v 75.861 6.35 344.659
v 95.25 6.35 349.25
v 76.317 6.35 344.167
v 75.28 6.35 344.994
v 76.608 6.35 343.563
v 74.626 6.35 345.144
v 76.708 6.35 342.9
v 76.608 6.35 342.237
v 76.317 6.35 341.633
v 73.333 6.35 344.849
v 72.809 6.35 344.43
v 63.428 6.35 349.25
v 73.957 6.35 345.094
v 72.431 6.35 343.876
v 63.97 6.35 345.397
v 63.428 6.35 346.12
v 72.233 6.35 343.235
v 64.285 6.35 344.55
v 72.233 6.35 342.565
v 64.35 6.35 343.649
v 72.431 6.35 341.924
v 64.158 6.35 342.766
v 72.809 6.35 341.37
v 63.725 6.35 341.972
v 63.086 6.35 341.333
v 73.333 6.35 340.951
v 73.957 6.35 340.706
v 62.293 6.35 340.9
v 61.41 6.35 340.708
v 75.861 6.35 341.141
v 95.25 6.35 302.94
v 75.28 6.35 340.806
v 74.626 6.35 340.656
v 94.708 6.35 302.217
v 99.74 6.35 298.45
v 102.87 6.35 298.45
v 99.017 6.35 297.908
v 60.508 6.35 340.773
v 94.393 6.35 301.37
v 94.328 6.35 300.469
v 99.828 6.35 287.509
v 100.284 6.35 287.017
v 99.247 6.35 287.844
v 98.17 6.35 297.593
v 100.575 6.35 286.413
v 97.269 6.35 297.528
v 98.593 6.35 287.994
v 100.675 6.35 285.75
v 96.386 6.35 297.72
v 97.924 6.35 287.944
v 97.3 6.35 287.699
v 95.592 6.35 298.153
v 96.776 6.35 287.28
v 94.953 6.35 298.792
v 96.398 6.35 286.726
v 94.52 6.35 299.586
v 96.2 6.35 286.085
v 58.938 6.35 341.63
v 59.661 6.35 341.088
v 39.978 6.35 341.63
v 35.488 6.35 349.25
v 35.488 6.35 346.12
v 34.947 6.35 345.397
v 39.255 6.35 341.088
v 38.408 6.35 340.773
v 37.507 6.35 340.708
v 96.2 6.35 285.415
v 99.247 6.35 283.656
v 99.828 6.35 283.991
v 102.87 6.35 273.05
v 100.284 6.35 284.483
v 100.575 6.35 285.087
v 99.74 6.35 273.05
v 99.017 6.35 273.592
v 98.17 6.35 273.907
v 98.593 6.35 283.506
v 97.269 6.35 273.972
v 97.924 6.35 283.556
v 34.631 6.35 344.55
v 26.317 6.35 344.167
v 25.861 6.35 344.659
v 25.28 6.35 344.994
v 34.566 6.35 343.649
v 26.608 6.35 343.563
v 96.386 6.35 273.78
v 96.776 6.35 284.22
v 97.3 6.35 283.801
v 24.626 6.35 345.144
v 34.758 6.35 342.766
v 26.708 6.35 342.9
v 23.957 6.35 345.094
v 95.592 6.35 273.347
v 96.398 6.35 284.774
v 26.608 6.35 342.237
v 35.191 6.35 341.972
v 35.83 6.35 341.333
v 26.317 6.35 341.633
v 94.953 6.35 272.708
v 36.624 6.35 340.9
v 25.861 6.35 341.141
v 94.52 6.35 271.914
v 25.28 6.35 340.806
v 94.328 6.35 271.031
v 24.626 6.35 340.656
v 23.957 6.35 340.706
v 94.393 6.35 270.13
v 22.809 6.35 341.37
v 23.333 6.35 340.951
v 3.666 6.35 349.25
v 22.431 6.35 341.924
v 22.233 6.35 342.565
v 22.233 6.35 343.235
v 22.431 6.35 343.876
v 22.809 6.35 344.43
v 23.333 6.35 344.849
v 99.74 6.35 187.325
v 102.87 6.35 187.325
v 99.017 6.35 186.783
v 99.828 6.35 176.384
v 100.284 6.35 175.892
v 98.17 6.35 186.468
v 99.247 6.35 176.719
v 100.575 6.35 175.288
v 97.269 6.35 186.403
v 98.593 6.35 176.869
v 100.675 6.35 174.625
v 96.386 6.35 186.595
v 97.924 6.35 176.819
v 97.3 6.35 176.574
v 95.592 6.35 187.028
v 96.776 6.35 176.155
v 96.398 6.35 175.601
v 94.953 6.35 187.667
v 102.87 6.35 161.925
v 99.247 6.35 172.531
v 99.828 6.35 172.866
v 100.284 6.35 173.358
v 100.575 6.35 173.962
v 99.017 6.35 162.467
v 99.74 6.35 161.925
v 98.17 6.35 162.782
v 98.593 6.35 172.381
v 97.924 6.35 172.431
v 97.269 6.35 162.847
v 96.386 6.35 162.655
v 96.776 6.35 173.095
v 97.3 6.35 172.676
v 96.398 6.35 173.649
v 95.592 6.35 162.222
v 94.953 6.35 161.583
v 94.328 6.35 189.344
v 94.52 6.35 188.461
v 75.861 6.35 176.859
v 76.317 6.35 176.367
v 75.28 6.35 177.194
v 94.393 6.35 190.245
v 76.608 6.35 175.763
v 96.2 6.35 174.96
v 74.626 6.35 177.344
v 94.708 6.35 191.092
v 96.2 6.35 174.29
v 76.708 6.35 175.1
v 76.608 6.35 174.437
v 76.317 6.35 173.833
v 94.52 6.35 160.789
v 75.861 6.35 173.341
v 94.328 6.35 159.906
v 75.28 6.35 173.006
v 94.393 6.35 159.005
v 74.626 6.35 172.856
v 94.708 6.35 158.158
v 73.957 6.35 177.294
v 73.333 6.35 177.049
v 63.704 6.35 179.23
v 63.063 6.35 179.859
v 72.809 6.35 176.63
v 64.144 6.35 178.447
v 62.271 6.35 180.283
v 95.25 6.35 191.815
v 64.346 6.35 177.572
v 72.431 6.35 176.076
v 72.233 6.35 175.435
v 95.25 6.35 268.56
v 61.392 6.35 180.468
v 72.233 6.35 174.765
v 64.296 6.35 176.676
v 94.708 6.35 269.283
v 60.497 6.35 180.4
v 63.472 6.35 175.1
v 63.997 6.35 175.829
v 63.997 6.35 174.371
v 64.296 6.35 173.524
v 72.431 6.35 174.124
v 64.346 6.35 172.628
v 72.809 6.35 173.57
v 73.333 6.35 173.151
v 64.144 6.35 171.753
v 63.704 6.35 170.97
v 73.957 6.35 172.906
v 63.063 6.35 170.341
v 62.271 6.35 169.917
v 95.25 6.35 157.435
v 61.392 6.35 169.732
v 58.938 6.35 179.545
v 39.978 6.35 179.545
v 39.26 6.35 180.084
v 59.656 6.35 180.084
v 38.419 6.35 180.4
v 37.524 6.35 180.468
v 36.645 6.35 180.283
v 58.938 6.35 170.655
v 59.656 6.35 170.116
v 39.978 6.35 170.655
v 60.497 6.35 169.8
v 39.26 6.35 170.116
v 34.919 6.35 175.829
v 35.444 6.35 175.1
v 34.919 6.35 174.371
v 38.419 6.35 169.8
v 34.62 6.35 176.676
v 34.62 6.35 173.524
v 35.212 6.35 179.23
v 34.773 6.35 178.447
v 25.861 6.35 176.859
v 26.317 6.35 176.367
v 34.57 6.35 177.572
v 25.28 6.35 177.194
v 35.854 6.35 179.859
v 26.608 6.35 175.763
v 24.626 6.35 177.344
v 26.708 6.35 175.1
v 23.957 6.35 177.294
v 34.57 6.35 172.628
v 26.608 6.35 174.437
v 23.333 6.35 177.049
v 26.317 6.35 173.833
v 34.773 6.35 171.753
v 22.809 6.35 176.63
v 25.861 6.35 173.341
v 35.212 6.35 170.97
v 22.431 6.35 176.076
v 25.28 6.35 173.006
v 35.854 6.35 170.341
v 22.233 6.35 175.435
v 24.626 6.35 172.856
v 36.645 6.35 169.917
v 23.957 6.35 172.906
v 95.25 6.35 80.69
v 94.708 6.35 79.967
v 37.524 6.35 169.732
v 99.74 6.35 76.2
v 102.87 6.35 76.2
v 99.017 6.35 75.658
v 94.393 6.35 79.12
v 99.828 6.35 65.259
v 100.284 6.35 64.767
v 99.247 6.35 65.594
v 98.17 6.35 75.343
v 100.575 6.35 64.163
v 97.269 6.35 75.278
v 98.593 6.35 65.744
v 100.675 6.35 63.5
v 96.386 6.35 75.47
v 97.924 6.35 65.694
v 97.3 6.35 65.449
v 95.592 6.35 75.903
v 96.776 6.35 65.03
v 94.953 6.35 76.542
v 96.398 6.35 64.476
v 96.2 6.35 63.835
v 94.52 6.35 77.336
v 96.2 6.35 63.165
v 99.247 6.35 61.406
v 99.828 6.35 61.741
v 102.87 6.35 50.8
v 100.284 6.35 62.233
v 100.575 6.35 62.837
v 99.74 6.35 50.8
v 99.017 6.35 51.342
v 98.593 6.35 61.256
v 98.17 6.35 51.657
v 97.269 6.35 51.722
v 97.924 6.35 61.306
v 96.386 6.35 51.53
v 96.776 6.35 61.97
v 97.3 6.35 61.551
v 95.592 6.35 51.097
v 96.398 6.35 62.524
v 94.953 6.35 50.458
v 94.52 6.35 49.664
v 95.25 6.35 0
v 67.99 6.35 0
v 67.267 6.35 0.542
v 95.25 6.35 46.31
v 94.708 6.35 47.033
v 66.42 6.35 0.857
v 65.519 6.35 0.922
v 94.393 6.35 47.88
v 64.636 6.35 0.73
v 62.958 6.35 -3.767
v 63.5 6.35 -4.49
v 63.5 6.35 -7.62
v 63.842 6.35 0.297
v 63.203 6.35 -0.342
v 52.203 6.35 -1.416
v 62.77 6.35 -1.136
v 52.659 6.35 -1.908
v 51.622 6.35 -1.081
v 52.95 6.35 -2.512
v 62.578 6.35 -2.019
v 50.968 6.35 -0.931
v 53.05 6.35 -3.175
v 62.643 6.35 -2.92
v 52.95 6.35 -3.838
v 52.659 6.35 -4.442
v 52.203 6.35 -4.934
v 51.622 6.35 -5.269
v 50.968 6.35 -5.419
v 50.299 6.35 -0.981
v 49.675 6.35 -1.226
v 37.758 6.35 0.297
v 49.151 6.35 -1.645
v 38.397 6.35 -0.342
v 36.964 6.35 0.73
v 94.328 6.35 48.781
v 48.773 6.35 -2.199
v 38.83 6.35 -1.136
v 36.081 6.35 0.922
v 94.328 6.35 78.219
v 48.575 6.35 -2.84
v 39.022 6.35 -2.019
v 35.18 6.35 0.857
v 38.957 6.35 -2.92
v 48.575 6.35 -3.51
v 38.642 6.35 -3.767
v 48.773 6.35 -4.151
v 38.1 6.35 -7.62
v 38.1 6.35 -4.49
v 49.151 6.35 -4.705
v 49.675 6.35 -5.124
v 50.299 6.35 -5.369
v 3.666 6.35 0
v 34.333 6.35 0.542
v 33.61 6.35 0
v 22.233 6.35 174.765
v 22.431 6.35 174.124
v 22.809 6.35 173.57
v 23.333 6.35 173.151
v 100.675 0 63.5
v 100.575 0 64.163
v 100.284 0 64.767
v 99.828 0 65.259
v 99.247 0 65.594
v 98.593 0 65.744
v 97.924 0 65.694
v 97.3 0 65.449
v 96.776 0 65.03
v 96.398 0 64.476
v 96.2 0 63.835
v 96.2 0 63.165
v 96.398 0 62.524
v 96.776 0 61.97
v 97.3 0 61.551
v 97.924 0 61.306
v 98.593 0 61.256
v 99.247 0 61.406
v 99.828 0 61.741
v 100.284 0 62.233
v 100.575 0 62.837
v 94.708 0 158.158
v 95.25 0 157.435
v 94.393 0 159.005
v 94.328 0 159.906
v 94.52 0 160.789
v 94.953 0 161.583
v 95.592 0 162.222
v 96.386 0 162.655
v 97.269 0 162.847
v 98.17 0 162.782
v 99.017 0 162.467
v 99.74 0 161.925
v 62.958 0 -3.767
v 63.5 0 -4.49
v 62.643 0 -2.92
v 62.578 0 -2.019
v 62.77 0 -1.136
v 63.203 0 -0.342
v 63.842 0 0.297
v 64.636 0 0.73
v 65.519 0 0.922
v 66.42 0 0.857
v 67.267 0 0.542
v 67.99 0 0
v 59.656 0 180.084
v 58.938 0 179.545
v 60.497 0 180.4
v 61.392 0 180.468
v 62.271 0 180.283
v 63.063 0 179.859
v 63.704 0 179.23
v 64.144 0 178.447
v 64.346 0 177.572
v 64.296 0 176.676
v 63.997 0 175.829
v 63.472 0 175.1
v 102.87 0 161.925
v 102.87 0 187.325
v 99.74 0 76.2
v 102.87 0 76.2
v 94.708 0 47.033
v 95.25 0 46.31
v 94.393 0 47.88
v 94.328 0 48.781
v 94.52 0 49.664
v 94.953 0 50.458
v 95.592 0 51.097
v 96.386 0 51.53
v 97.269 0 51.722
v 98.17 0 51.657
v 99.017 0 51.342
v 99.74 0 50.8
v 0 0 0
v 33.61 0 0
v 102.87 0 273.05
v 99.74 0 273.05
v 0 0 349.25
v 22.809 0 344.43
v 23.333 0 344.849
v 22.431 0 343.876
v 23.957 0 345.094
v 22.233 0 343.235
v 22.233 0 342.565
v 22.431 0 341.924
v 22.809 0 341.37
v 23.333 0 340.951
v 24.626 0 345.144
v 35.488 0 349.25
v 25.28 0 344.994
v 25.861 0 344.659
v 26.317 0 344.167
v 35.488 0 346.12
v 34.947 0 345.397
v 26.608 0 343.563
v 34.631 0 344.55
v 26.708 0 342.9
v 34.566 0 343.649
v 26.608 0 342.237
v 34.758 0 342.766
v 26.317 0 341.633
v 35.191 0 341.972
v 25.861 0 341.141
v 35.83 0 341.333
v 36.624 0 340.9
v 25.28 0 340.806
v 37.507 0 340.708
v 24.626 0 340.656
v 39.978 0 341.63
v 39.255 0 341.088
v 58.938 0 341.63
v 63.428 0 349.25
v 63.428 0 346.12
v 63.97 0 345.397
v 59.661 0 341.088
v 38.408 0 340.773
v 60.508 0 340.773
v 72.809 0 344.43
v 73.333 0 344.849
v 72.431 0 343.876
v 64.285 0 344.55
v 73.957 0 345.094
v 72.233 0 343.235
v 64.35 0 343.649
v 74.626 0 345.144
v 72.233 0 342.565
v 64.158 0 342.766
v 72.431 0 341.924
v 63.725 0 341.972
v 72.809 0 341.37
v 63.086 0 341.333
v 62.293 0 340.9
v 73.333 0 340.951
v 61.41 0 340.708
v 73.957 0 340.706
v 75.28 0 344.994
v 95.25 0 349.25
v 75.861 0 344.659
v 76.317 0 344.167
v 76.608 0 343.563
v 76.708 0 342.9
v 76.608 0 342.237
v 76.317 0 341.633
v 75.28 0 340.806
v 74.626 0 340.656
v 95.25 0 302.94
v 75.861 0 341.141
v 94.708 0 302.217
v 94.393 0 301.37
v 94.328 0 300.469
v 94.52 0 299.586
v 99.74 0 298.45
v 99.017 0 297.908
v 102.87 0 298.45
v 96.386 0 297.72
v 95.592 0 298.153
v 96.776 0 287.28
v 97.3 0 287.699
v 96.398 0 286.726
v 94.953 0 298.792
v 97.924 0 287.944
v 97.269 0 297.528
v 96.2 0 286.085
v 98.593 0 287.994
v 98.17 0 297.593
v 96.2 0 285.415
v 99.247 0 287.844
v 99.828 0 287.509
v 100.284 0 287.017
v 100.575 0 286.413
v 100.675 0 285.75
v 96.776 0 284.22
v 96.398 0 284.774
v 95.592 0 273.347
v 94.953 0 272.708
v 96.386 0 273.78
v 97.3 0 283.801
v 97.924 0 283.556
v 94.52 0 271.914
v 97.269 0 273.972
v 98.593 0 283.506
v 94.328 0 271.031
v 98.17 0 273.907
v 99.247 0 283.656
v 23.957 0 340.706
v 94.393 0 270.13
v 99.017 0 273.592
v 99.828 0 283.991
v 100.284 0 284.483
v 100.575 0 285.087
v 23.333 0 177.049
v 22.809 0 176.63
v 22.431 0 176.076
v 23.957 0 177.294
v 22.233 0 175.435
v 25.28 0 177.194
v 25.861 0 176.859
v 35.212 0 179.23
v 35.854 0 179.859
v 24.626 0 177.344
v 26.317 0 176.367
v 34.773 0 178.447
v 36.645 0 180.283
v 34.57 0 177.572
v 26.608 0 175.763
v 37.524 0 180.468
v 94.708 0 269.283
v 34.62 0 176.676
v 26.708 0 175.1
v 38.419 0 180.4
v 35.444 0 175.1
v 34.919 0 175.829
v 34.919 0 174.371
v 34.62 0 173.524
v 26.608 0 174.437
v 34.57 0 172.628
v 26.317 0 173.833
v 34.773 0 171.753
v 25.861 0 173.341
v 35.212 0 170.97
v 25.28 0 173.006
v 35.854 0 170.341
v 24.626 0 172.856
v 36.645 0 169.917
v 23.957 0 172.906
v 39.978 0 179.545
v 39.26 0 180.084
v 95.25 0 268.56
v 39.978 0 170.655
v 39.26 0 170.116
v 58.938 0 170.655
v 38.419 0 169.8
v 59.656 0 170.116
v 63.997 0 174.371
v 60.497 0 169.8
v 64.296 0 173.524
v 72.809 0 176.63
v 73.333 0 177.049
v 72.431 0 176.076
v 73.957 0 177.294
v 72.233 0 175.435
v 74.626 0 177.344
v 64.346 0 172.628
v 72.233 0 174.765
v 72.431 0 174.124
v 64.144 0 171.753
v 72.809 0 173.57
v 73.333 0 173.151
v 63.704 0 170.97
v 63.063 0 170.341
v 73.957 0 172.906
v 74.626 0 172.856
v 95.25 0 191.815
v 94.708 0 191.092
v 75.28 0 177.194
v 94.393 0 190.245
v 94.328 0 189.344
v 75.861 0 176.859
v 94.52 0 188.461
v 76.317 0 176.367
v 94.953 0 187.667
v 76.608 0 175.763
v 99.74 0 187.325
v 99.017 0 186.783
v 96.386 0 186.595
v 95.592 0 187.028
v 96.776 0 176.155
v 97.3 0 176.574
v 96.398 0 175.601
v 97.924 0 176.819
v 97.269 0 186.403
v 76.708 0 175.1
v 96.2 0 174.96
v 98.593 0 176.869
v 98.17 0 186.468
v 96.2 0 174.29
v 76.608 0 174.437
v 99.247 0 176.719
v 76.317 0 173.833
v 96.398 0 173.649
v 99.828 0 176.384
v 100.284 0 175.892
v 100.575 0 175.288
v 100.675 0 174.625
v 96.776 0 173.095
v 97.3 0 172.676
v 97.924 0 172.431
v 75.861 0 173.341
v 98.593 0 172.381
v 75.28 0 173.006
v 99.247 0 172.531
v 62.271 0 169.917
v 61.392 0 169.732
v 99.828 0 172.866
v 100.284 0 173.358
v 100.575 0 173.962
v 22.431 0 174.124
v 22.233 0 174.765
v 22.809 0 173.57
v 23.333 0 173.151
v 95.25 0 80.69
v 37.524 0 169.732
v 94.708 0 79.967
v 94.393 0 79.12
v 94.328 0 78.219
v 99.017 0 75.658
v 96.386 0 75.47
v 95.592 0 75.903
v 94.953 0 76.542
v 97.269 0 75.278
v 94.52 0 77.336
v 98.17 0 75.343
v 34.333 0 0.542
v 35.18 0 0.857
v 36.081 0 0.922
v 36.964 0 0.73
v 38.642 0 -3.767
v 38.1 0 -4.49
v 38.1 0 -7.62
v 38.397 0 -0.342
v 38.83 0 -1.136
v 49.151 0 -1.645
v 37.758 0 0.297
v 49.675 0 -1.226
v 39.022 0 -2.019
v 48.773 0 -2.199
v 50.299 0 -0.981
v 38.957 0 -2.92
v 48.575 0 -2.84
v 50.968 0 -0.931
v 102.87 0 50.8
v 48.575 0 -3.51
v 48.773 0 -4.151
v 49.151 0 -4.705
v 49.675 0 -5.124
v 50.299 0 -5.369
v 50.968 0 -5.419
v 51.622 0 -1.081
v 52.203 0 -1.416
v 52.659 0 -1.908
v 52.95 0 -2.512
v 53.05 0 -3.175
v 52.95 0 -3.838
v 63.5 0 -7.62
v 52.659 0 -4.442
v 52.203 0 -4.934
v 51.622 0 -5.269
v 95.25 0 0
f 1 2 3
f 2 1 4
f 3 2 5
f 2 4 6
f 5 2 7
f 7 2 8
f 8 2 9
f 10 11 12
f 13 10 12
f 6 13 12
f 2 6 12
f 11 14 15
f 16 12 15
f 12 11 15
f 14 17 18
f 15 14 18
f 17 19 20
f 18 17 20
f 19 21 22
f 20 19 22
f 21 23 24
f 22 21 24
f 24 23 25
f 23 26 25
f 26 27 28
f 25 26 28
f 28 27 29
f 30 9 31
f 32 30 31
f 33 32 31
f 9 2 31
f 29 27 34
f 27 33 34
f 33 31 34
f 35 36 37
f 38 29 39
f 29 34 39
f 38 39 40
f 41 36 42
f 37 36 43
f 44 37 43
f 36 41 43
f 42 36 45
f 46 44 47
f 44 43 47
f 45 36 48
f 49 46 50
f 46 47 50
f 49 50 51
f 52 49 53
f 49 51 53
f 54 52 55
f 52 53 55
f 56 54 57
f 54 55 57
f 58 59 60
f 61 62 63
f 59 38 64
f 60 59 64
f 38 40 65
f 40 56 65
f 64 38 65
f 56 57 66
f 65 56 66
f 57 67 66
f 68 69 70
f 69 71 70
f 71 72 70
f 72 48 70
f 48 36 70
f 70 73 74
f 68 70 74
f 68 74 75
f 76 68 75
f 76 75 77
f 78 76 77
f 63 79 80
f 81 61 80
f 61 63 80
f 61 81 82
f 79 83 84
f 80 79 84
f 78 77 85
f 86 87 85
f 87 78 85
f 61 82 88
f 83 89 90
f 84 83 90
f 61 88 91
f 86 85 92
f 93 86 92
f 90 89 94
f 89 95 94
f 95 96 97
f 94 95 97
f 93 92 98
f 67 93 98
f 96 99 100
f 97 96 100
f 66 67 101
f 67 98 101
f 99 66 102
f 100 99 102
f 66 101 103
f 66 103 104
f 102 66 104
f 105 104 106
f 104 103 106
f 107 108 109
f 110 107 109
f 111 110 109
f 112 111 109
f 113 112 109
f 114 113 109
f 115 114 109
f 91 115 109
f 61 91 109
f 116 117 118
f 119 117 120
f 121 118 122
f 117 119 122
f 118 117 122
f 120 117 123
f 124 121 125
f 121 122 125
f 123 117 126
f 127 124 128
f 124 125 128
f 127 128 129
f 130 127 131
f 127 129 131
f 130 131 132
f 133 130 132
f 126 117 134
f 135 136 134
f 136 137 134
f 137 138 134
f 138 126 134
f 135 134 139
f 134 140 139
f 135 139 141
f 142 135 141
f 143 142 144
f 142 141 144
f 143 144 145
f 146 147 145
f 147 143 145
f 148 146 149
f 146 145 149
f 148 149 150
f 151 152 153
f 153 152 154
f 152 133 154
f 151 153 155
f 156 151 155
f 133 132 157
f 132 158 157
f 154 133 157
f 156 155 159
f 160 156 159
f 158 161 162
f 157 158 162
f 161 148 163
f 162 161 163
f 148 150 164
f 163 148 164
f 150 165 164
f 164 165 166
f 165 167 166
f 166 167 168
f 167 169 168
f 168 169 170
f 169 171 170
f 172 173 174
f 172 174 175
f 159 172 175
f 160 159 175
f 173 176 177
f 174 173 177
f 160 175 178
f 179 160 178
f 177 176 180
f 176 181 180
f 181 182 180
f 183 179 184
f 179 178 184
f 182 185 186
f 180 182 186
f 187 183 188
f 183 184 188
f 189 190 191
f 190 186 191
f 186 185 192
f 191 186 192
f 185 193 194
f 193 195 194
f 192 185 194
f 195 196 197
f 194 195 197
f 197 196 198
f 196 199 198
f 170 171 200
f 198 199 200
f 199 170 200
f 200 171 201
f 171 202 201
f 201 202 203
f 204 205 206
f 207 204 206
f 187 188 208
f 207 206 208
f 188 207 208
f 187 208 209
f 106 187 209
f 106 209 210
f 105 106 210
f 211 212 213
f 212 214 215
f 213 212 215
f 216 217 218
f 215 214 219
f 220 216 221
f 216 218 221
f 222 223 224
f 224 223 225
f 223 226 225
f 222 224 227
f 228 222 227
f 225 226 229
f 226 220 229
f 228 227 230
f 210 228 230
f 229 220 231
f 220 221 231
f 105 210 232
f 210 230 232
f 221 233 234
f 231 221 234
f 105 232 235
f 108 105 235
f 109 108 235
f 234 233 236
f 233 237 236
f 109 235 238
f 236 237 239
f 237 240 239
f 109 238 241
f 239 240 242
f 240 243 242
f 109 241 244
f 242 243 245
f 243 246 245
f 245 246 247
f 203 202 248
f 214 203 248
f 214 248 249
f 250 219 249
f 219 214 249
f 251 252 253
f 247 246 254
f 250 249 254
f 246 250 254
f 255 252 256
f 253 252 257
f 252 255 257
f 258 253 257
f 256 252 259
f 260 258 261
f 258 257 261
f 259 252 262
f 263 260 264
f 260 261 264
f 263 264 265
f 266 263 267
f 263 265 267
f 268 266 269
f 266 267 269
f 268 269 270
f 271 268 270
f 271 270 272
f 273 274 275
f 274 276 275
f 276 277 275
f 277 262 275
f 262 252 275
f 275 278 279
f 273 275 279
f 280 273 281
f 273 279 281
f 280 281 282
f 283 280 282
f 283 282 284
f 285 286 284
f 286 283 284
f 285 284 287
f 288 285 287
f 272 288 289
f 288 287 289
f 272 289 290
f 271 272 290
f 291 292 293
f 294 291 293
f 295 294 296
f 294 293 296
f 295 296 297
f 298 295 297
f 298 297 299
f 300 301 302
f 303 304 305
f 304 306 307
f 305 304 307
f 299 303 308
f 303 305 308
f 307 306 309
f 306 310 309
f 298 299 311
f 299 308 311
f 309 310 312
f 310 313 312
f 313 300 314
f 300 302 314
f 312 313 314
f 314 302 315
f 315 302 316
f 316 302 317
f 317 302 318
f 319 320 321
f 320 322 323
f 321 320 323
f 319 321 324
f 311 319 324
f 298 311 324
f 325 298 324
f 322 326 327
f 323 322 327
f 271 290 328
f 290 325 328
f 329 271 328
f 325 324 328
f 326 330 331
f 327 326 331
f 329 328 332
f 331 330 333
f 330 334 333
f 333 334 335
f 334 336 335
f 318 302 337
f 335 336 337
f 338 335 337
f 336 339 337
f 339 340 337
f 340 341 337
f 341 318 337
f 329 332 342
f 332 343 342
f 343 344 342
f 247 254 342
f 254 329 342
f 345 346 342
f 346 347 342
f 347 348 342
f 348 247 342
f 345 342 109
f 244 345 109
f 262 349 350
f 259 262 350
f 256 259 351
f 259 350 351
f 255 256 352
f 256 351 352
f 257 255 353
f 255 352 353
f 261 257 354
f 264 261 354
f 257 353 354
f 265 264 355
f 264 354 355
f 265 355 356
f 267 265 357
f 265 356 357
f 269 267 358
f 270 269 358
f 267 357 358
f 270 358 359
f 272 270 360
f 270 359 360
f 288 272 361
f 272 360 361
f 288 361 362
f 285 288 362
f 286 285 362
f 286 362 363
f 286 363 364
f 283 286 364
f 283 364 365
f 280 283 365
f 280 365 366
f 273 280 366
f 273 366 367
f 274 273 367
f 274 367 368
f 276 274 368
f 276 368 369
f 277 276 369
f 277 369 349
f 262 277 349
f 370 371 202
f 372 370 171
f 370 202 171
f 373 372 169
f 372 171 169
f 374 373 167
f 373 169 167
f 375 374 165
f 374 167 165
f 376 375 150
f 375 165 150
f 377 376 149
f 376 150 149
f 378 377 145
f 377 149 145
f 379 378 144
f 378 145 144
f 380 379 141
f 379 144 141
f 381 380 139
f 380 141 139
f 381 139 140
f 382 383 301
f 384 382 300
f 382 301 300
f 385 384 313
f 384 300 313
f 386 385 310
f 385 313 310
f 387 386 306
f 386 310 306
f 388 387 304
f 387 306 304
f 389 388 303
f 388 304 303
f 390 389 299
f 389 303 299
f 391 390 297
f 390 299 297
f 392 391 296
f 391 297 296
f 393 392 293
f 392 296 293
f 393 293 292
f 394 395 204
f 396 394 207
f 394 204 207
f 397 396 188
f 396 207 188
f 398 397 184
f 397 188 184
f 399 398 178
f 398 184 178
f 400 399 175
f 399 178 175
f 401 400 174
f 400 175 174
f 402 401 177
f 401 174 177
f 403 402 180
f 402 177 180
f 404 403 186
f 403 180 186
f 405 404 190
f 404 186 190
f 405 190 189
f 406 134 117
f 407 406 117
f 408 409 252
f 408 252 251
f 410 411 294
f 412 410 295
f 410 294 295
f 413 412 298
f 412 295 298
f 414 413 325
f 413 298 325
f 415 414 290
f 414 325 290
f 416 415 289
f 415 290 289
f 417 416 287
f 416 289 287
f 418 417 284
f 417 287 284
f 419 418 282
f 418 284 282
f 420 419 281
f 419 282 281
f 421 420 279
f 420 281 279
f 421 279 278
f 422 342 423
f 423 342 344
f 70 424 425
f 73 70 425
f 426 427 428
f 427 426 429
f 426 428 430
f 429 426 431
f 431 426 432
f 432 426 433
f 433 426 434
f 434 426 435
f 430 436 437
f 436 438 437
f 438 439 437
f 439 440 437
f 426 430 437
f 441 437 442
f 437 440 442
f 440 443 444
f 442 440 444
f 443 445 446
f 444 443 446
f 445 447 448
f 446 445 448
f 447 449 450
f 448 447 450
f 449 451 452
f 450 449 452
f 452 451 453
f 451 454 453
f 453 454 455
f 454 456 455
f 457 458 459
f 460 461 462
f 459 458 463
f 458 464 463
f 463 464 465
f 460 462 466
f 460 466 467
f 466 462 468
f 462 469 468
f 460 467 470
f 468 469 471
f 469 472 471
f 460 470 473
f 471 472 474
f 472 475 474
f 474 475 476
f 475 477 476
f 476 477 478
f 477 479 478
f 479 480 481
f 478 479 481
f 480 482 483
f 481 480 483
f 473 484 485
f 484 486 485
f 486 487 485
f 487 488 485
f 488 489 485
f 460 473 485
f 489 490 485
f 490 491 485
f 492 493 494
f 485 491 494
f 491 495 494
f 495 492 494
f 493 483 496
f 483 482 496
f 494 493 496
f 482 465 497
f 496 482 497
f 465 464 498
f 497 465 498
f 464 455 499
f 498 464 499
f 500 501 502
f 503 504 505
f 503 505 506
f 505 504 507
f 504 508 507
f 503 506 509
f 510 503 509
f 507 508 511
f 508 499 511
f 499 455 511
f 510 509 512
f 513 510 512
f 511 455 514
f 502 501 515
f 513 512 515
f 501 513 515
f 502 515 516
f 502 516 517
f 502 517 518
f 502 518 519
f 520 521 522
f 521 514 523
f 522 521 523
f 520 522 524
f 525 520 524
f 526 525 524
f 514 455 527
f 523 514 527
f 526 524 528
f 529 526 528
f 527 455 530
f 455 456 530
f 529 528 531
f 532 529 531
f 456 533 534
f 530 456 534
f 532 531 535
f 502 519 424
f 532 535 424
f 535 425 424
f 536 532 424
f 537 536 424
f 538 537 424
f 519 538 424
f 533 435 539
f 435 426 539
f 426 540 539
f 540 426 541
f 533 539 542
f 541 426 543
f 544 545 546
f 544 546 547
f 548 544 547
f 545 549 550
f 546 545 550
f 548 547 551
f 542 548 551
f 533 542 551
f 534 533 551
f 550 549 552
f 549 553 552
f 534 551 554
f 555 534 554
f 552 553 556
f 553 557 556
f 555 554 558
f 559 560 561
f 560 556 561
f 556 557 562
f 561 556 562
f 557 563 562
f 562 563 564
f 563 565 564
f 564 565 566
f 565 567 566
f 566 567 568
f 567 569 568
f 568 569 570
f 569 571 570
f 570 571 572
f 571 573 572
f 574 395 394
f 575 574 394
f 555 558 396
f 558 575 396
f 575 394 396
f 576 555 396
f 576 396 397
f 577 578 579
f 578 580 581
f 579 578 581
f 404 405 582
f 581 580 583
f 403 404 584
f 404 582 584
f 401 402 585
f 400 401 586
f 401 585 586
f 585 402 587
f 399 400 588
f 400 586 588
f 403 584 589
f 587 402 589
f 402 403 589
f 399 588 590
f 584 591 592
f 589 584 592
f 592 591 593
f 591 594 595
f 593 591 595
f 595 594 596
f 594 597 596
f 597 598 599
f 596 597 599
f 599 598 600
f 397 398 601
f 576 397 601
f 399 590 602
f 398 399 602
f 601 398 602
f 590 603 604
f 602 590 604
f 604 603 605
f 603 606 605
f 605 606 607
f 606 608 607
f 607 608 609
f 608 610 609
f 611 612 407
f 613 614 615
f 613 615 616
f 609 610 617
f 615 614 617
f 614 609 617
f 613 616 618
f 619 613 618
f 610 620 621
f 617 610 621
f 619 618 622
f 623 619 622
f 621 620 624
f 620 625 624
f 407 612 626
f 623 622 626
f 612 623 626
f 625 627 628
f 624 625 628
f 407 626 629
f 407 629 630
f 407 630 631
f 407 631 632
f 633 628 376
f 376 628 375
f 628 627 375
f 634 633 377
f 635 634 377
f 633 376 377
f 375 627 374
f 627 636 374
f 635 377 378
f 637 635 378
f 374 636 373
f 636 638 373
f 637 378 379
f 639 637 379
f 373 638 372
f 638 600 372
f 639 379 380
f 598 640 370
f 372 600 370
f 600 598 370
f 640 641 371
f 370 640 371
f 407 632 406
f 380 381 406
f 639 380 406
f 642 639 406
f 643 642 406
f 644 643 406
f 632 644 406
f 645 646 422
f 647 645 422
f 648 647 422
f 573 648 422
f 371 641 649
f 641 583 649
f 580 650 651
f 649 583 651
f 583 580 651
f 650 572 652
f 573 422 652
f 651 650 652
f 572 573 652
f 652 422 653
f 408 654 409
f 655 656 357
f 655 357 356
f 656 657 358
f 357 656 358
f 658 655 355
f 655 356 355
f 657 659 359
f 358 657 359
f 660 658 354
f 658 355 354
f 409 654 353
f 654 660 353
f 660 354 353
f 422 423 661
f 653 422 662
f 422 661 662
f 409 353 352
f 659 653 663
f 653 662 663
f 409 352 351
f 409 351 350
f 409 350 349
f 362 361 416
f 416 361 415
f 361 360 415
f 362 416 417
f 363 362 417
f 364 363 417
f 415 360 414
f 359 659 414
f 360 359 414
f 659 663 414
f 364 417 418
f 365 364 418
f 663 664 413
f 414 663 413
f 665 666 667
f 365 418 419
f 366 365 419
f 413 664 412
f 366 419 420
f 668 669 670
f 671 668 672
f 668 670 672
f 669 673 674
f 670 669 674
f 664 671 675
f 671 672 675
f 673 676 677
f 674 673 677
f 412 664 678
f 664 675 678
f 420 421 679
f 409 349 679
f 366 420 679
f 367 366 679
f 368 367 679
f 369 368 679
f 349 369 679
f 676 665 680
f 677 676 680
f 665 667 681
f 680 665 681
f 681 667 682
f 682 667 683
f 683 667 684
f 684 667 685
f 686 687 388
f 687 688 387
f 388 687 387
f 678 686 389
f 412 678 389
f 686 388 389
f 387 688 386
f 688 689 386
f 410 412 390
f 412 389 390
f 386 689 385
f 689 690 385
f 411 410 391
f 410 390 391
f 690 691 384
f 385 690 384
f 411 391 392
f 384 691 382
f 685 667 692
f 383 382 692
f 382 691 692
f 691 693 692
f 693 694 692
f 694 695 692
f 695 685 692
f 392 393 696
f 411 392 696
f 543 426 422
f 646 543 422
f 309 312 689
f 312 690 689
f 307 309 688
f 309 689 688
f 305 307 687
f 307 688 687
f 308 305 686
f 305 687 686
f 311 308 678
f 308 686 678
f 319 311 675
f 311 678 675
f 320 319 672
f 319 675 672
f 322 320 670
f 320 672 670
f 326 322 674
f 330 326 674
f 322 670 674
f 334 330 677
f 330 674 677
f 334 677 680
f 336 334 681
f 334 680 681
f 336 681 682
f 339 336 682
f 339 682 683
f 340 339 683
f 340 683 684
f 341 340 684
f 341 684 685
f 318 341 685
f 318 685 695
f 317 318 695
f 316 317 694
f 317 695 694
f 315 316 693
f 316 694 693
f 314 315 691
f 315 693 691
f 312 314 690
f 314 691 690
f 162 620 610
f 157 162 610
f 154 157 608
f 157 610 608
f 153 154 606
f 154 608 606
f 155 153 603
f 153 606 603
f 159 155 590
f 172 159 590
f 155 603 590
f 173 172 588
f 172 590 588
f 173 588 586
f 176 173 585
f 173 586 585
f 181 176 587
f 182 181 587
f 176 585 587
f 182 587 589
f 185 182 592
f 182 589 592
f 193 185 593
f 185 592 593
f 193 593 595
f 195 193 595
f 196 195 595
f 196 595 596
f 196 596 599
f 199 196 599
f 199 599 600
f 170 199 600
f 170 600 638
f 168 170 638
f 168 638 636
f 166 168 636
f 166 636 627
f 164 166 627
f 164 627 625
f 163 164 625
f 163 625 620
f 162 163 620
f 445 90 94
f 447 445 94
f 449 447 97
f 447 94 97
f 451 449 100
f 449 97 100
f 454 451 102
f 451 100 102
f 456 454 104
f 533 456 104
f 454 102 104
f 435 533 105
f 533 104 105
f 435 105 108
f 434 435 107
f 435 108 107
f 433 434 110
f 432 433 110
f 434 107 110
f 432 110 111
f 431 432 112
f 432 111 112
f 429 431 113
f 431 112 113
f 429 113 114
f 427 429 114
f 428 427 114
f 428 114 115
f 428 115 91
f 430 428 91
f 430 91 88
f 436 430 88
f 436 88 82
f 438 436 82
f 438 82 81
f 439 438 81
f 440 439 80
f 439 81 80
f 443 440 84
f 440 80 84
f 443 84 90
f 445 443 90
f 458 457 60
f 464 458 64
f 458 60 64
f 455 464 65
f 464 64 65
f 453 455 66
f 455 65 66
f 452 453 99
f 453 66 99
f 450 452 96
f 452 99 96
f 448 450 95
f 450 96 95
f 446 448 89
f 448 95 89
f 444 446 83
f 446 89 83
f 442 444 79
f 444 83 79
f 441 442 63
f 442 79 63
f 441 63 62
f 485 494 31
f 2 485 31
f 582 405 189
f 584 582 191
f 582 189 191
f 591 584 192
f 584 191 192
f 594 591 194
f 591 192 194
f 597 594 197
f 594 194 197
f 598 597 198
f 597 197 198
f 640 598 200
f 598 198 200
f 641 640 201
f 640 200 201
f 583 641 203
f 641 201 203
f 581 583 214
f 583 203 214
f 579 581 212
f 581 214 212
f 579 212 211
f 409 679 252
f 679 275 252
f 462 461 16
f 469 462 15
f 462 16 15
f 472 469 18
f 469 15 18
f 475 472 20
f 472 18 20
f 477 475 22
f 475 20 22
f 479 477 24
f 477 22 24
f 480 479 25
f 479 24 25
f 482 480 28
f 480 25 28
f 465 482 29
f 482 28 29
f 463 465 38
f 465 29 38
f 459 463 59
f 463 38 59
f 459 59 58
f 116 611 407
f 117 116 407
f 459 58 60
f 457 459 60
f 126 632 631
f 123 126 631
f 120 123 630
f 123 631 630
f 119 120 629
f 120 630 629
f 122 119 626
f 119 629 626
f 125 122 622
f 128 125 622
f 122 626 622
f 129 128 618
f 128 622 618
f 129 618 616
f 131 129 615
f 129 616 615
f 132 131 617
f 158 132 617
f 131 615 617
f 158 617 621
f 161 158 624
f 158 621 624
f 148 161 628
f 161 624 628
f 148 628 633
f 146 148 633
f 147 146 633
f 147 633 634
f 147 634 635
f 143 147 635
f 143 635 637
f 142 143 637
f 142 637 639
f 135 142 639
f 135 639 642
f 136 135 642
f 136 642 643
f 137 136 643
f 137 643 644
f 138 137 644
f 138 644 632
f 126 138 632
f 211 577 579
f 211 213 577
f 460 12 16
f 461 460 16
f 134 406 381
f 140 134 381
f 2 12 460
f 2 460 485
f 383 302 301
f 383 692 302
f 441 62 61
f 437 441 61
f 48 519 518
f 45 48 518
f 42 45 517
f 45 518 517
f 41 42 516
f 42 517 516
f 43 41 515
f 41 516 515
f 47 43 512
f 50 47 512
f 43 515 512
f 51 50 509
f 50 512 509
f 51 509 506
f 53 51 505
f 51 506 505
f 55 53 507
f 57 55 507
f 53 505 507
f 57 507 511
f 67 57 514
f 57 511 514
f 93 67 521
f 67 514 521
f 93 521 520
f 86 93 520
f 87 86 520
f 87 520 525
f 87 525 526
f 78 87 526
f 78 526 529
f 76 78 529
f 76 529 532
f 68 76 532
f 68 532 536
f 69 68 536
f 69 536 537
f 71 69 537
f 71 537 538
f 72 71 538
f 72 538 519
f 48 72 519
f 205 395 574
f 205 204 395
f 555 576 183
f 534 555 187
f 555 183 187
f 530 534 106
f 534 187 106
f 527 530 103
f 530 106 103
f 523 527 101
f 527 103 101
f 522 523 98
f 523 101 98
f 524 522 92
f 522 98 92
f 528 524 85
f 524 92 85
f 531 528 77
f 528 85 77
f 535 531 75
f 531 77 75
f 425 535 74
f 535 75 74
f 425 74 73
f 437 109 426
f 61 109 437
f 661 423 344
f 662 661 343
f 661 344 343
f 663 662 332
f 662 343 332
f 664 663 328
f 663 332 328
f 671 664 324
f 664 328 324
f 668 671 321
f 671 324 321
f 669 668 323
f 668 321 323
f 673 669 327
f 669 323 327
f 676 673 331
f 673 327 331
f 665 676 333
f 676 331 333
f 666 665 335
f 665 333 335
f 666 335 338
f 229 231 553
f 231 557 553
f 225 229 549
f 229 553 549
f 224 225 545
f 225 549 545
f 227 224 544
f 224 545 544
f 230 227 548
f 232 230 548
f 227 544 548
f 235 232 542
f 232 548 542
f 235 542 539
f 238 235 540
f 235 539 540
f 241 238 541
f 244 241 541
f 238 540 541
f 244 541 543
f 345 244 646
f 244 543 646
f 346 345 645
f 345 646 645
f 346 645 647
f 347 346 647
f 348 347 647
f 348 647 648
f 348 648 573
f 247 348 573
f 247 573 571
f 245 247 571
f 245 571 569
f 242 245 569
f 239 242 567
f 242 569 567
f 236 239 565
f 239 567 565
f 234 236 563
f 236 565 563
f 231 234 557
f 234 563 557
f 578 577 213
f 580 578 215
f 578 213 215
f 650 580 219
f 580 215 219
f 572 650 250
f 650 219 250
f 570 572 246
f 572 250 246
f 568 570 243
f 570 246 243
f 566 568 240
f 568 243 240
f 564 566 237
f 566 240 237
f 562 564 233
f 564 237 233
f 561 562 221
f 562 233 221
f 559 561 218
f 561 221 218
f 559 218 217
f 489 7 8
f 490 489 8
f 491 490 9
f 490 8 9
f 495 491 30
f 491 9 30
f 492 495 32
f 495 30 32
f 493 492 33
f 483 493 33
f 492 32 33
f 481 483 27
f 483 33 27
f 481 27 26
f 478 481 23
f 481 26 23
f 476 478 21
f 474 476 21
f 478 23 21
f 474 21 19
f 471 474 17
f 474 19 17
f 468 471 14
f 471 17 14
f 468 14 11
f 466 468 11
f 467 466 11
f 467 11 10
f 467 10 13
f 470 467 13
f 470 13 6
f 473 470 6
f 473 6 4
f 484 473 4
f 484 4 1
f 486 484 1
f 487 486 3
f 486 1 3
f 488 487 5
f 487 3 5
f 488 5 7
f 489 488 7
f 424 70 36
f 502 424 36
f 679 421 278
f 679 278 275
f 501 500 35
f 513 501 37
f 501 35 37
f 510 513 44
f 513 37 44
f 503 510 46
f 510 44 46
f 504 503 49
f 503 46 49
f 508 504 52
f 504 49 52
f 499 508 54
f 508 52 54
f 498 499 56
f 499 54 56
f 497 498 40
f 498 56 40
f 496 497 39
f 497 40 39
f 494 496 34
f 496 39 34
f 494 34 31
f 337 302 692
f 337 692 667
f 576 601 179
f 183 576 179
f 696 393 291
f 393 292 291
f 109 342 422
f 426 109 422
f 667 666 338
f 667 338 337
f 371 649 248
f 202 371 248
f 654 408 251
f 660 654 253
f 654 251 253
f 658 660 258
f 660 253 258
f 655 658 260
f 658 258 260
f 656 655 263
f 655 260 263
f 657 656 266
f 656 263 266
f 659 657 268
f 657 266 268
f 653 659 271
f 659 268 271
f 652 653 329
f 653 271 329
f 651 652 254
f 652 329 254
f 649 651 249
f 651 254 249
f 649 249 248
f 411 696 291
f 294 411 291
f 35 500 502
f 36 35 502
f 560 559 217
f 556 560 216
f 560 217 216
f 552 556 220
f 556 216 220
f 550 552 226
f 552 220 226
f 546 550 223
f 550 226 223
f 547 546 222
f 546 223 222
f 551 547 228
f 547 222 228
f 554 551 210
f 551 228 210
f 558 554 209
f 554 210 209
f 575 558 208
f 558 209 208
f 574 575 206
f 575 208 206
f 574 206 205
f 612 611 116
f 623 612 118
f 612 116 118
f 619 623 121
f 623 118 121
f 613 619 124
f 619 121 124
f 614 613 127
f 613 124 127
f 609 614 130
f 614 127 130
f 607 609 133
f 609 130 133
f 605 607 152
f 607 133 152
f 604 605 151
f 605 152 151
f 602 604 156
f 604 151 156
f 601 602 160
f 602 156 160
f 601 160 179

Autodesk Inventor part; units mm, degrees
ref_plane "YZ Plane" through (0, 0, 0) normal (1, 0, 0) x (0, 1, 0)
ref_plane "XZ Plane" through (0, 0, 0) normal (0, 1, 0) x (-1, 0, 0)
sketch "Sketch1" plane through (0, 0, 0) normal (0, 0, 1) x (1, 0, 0)
  line L0 (0, 0) -> (95.25, 0)
  line L1 (95.25, 0) -> (95.25, 6.35)
  line L2 (95.25, 6.35) -> (3.6662, 6.35)
  line L3 (3.6662, 6.35) -> (0, 0)
  dimension "d0" = 95.25
  dimension "d1" = 6.35
  dimension "d2" = 60
extrude "Extrusion1" add sketch "Sketch1" along normal blind 349.25
sketch "Sketch2" plane through (0, 0, 0) normal (0, -1, 0) x (1, 0, 0)
  line L0 (38.1, 349.25) -> (63.5, 349.25)
  line L1 (63.5, 349.25) -> (63.5, 355.6)
  line L2 (63.5, 355.6) -> (38.1, 355.6)
  line L3 (38.1, 355.6) -> (38.1, 349.25)
  line L4 (0, 349.25) -> (101.6, 349.25)
  line L5 (0, 349.25) -> (95.25, 349.25) projected
  point P0 (0, 0)
  point P1 (50.8, 349.25)
  dimension "d5" = 25.4
  dimension "d6" = 6.35
  dimension "d9" = 101.6
extrude "Extrusion2" add sketch "Sketch2" against normal blind 6.35
sketch "Sketch3" plane through (0, 0, 0) normal (0, -1, 0) x (1, 0, 0)
  line L0 (63.5, 349.25) -> (63.5, 355.6) projected
  line L1 (63.5, 355.6) -> (38.1, 355.6) projected
  circle A0 centre (50.8, 352.425) radius 2.25
  point P0 (0, 0)
  point P1 (50.8, 355.6)
  point P2 (63.5, 352.425)
  dimension "d10" = 4.5
extrude "Extrusion3" cut sketch "Sketch3" against normal through all
sketch "Sketch4" plane through (0, 0, 0) normal (0, -1, 0) x (1, 0, 0)
  line L0 (95.25, 0) -> (95.25, 349.25) projected
  line L1 (95.25, 50.8) -> (101.6, 50.8)
  line L2 (101.6, 50.8) -> (101.6, 76.2)
  line L3 (101.6, 76.2) -> (95.25, 76.2)
  line L4 (95.25, 76.2) -> (95.25, 50.8)
  line L5 (95.25, 298.45) -> (101.6, 298.45)
  line L6 (101.6, 298.45) -> (101.6, 273.05)
  line L7 (101.6, 273.05) -> (95.25, 273.05)
  line L8 (95.25, 273.05) -> (95.25, 298.45)
  line L9 (95.25, 187.325) -> (101.6, 187.325)
  line L10 (101.6, 187.325) -> (101.6, 161.925)
  line L11 (101.6, 161.925) -> (95.25, 161.925)
  line L12 (95.25, 161.925) -> (95.25, 187.325)
  circle A0 centre (98.425, 285.75) radius 2.25
  circle A1 centre (98.425, 174.625) radius 2.25
  circle A2 centre (98.425, 63.5) radius 2.25
  point P0 (0, 0)
  point P1 (95.25, 174.625)
  point P2 (98.425, 298.45)
  point P3 (98.425, 187.325)
  point P4 (98.425, 76.2)
  point P5 (101.6, 285.75)
  point P6 (101.6, 174.625)
  point P7 (101.6, 63.5)
  dimension "d13" = 6.35
  dimension "d14" = 25.4
  dimension "d15" = 6.35
  dimension "d16" = 25.4
  dimension "d17" = 6.35
  dimension "d18" = 25.4
  dimension "d19" = 50.8
  dimension "d20" = 50.8
  dimension "d21" = 4.5
  dimension "d22" = 4.5
  dimension "d23" = 4.5
extrude "Extrusion4" add sketch "Sketch4" against normal blind 6.35
sketch "Sketch9" plane through (95.25, 0, 298.45) normal (0, 0, 1) x (1, 0, 0)
  line L0 (-95.25, 0) -> (0, 0) projected
  line L1 (-95.25, 0) -> (-95.25, 6.35)
  line L2 (0, 6.35) -> (-91.5838, 6.35) projected
  line L3 (-95.25, 6.35) -> (-91.5838, 6.35)
  line L4 (-91.5838, 6.35) -> (-95.25, 0)
  line L5 (-91.5838, 6.35) -> (-95.25, 0) projected
extrude "Extrusion9" [suppressed]
sketch "Sketch10" plane through (95.25, 0, 187.325) normal (0, 0, 1) x (1, 0, 0)
  line L0 (-81.5677, 12.7) -> (-88.9, 0) projected
  line L1 (-81.5677, 12.7) -> (-88.9, 12.7) projected
  line L2 (-88.9, 12.7) -> (-88.9, 0) projected
  point P0 (-95.25, 0)
extrude "Extrusion10" [suppressed]
sketch "Sketch11" plane through (95.25, 0, 76.2) normal (0, 0, 1) x (1, 0, 0)
  line L0 (-81.5677, 12.7) -> (-88.9, 0) projected
  line L1 (-81.5677, 12.7) -> (-88.9, 12.7) projected
  line L2 (-88.9, 12.7) -> (-88.9, 0) projected
  point P0 (-95.25, 0)
extrude "Extrusion11" [suppressed]
ref_plane "Work Plane1" through (0, 0, 174.625) normal (0, 0, 1) x (1, 0, 0)
mirror "Mirror1" about plane through (0, 0, 174.625) normal (0, 0, 1) of "Extrusion1", "Extrusion2", "Extrusion3", "Extrusion4"
sketch "Sketch12" plane through (3.6662, 6.35, 349.25) normal (0, 1, 0) x (1, 0, 0)
  line L0 (59.8338, 0) -> (59.8338, -6.35) projected
  line L1 (59.8338, -6.35) -> (59.8338, 0) projected
  line L2 (59.8338, -6.35) -> (34.4338, -6.35) projected
  line L3 (34.4338, -6.35) -> (59.8338, -6.35) projected
  line L4 (34.4338, 0) -> (34.4338, -6.35) projected
  line L5 (59.8338, 0) -> (34.4338, 0)
  line L6 (91.5838, 0) -> (59.8338, 0) projected
  line L7 (34.4338, -6.35) -> (59.8338, -6.35)
  line L8 (59.8338, -6.35) -> (59.8338, 0)
  line L9 (59.8338, 0) -> (34.4338, 0)
  line L10 (34.4338, 0) -> (34.4338, -6.35)
  point P0 (-3.6662, 349.25)
extrude "Extrusion12" cut sketch "Sketch12" along normal through all both and the other way through all
sketch "Sketch13" plane through (3.6662, 6.35, 349.25) normal (0, 1, 0) x (1, 0, 0)
  circle A0 centre (20.7919, 6.35) radius 2.25
  line L0 (91.5838, 0) -> (0, 0) projected
  circle A1 centre (70.7919, 6.35) radius 2.25
  line L1 (33.0919, 0) -> (58.4919, 0)
  line L2 (58.4919, 0) -> (58.4919, 6.35)
  line L3 (58.4919, 6.35) -> (33.0919, 6.35)
  line L4 (33.0919, 6.35) -> (33.0919, 0)
  line L5 (20.7919, 6.35) -> (70.7919, 6.35) construction
  point P0 (-3.6662, 349.25)
  point P1 (45.7919, 6.35)
  point P2 (45.7919, 0)
  point P3 (45.7919, 0)
  dimension "d44" = 4.5
  dimension "d45" = 6.35
  dimension "d46" = 4.5
  dimension "d47" = 25.4
  dimension "d48" = 6.35
  dimension "d49" = 50
extrude "Extrusion13" cut sketch "Sketch13" against normal through all
sketch "Sketch14" plane through (95.25, 0, 50.8) normal (0, -1, 0) x (1, 0, 0)
  line L0 (6.35, 111.125) -> (6.35, 136.525) projected
  line L1 (-33.0919, 292.1) -> (-58.4919, 292.1) projected
  line L2 (-58.4919, 127.475) -> (-33.0919, 127.475)
  line L3 (-33.0919, 127.475) -> (-33.0919, 121.125)
  line L4 (-33.0919, 121.125) -> (-58.4919, 121.125)
  line L5 (-58.4919, 121.125) -> (-58.4919, 127.475)
  point P0 (-95.25, -50.8)
  dimension "d54" = 6.35
  dimension "d55" = 10
extrude "Extrusion14" cut sketch "Sketch14" against normal through all
sketch "Sketch15" plane through (95.25, 0, 50.8) normal (0, -1, 0) x (1, 0, 0)
  circle A0 centre (-70.7919, 124.3) radius 2.25
  circle A1 centre (-20.7919, 124.3) radius 2.25
  circle A2 centre (-70.7919, 292.1) radius 2.25 projected
  circle A3 centre (-20.7919, 292.1) radius 2.25 projected
  line L0 (-33.0919, 127.475) -> (-33.0919, 121.125) projected
  point P0 (-95.25, -50.8)
  point P1 (-33.0919, 124.3)
  point P2 (-33.0919, 124.3)
  dimension "d56" = 4.5
  dimension "d57" = 4.5
extrude "Extrusion15" cut sketch "Sketch15" against normal through all contours A0 | A1
sketch "Sketch16" plane through (95.25, 6.35, 298.45) normal (0, 1, 0) x (1, 0, 0)
  line L0 (-59.7619, 127.795) -> (-31.8219, 127.795)
  line L1 (-31.8219, 127.795) -> (-31.8219, 118.905)
  line L2 (-31.8219, 118.905) -> (-59.7619, 118.905)
  line L3 (-59.7619, 118.905) -> (-59.7619, 127.795)
  line L4 (-95.25, -50.8) -> (-58.4919, -50.8) projected
  line L5 (-59.7619, -50.8) -> (-31.8219, -50.8)
  line L6 (-31.8219, -50.8) -> (-31.8219, -43.18)
  line L7 (-31.8219, -43.18) -> (-59.7619, -43.18)
  line L8 (-59.7619, -43.18) -> (-59.7619, -50.8)
  line L9 (-33.0919, 120.175) -> (-58.4919, 120.175) projected
  line L10 (-58.4919, -44.45) -> (-33.0919, -44.45) projected
  line L11 (-58.4919, 120.175) -> (-58.4919, 126.525) projected
  circle A0 centre (-59.3951, 300.6951) radius 3.175
  circle A1 centre (-29.5049, 300.6951) radius 3.175
  circle A2 centre (2.2451, 249.8951) radius 3.175
  circle A3 centre (2.2451, 220.0049) radius 3.175
  circle A4 centre (2.2451, 138.7701) radius 3.175
  circle A5 centre (2.2451, 108.8799) radius 3.175
  circle A6 centre (2.2451, 27.6451) radius 3.175
  circle A7 centre (2.2451, -2.2451) radius 3.175
  line L12 (-59.3951, 300.6951) -> (-57.15, 298.45)
  line L13 (-57.15, 304.8) -> (-57.15, 298.45) projected
  line L14 (0, 247.65) -> (2.2451, 249.8951)
  line L15 (6.35, 247.65) -> (0, 247.65) projected
  point P0 (-95.25, 298.45)
  point P1 (-45.7919, 120.175)
  point P2 (-45.7919, 118.905)
  point P3 (-45.7919, -43.18)
  point P4 (-45.7919, -44.45)
  point P5 (-58.4919, 123.35)
  point P6 (-59.7619, 123.35)
  point P7 (0, 0)
  point P8 (0, 25.4)
  point P9 (0, 111.125)
  point P10 (0, 136.525)
  point P11 (0, 222.25)
  point P12 (-31.75, 298.45)
  dimension "d63" = 6.35
  dimension "d64" = 6.35
  dimension "d65" = 6.35
  dimension "d66" = 6.35
  dimension "d67" = 6.35
  dimension "d68" = 6.35
  dimension "d69" = 6.35
  dimension "d70" = 6.35
  dimension "d60" = 1.27
  dimension "d61" = 1.27
  dimension "d62" = 1.27
  dimension "d77" = 45
  dimension "d78" = 45
extrude "Extrusion16" cut sketch "Sketch16" against normal through all
sketch "Sketch17" plane through (101.6, 6.35, 298.45) normal (0, 1, 0) x (1, 0, 0)
  line L0 (-63.5, 304.8) -> (-38.1, 304.8)
  line L1 (-38.1, 304.8) -> (-38.1, 306.07)
  line L2 (-38.1, 306.07) -> (-63.5, 306.07)
  line L3 (-63.5, 306.07) -> (-63.5, 304.8)
  line L4 (0, 247.65) -> (1.27, 247.65)
  line L5 (1.27, 247.65) -> (1.27, 222.25)
  line L6 (1.27, 222.25) -> (0, 222.25)
  line L7 (0, 222.25) -> (0, 247.65)
  line L8 (0, 136.525) -> (1.27, 136.525)
  line L9 (1.27, 136.525) -> (1.27, 111.125)
  line L10 (1.27, 111.125) -> (0, 111.125)
  line L11 (0, 111.125) -> (0, 136.525)
  line L12 (0, 25.4) -> (1.27, 25.4)
  line L13 (1.27, 25.4) -> (1.27, 0)
  line L14 (1.27, 0) -> (0, 0)
  line L15 (0, 0) -> (0, 25.4)
  point P0 (-101.6, 298.45)
  dimension "d73" = 1.27
  dimension "d74" = 1.27
extrude "Extrusion17" add sketch "Sketch17" against normal up to surface (6.35 mm away) from surface at 0
sketch "Sketch18" plane through (3.6662, 6.35, 349.25) normal (0, 1, 0) x (1, 0, 0)
  line L0 (59.7619, 7.62) -> (59.7619, 0) construction
  line L1 (91.5838, 0) -> (59.7619, 0) construction
  line L2 (91.5838, 46.3099) -> (91.5838, 0) construction
  arc A0 (96.074, 50.8) -> (91.5838, 46.3099) centre (93.8289, 48.5549) ccw construction
  line L3 (96.074, 50.8) -> (99.2038, 50.8) construction
  line L4 (99.2038, 76.2) -> (99.2038, 50.8) construction
  line L5 (96.074, 76.2) -> (99.2038, 76.2) construction
  arc A1 (91.5838, 80.6901) -> (96.074, 76.2) centre (93.8289, 78.4451) ccw construction
  line L6 (91.5838, 157.4349) -> (91.5838, 80.6901) construction
  arc A2 (96.074, 161.925) -> (91.5838, 157.4349) centre (93.8289, 159.6799) ccw construction
  line L7 (96.074, 161.925) -> (99.2038, 161.925) construction
  line L8 (99.2038, 187.325) -> (99.2038, 161.925) construction
  line L9 (96.074, 187.325) -> (99.2038, 187.325) construction
  arc A3 (91.5838, 191.8151) -> (96.074, 187.325) centre (93.8289, 189.5701) ccw construction
  line L10 (91.5838, 268.5599) -> (91.5838, 191.8151) construction
  arc A4 (96.074, 273.05) -> (91.5838, 268.5599) centre (93.8289, 270.8049) ccw construction
  line L11 (96.074, 273.05) -> (99.2038, 273.05) construction
  line L12 (99.2038, 298.45) -> (99.2038, 273.05) construction
  line L13 (96.074, 298.45) -> (99.2038, 298.45) construction
  arc A5 (91.5838, 302.9401) -> (96.074, 298.45) centre (93.8289, 300.6951) ccw construction
  line L14 (91.5838, 349.25) -> (91.5838, 302.9401) construction
  line L15 (91.5838, 349.25) -> (64.324, 349.25) construction
  arc A6 (59.8338, 353.7401) -> (64.324, 349.25) centre (62.0789, 351.4951) ccw construction
  line L16 (59.8338, 356.87) -> (59.8338, 353.7401) construction
  line L17 (34.4338, 356.87) -> (59.8338, 356.87) construction
  line L18 (34.4338, 353.7401) -> (34.4338, 356.87) construction
  arc A7 (29.9437, 349.25) -> (34.4338, 353.7401) centre (32.1888, 351.4951) ccw construction
  line L19 (29.9437, 349.25) -> (0, 349.25) construction
  line L20 (0, 349.25) -> (0, 0) construction
  line L21 (31.8219, 0) -> (0, 0) construction
  line L22 (31.8219, 0) -> (31.8219, 7.62) construction
  line L23 (31.8219, 7.62) -> (59.7619, 7.62) construction
  line L24 (31.8219, 169.705) -> (31.8219, 178.595) construction
  line L25 (31.8219, 178.595) -> (59.7619, 178.595) construction
  line L26 (59.7619, 178.595) -> (59.7619, 169.705) construction
  line L27 (59.7619, 169.705) -> (31.8219, 169.705) construction
  circle A8 centre (20.7919, 174.15) radius 2.25 construction
  circle A9 centre (70.7919, 174.15) radius 2.25 construction
  circle A10 centre (94.7588, 285.75) radius 2.25 construction
  circle A11 centre (94.7588, 63.5) radius 2.25 construction
  circle A12 centre (94.7588, 174.625) radius 2.25 construction
  circle A13 centre (47.1338, 352.425) radius 2.25 construction
  circle A14 centre (20.7919, 6.35) radius 2.25 construction
  circle A15 centre (70.7919, 6.35) radius 2.25 construction
  line L28 (62.0789, 351.4951) -> (93.8289, 351.4951) construction
  line L29 (93.8289, 351.4951) -> (93.8289, 300.6951) construction
  line L30 (93.8289, 300.6951) -> (101.4489, 300.6951) construction
  line L31 (101.4489, 300.6951) -> (101.4489, 270.8049) construction
  line L32 (101.4489, 270.8049) -> (93.8289, 270.8049) construction
  line L33 (93.8289, 270.8049) -> (93.8289, 189.5701) construction
  line L34 (93.8289, 189.5701) -> (101.4489, 189.5701) construction
  line L35 (101.4489, 189.5701) -> (101.4489, 159.6799) construction
  line L36 (101.4489, 159.6799) -> (93.8289, 159.6799) construction
  line L37 (93.8289, 159.6799) -> (93.8289, 78.4451) construction
  line L38 (93.8289, 78.4451) -> (101.4489, 78.4451) construction
  line L39 (101.4489, 78.4451) -> (101.4489, 48.5549) construction
  line L40 (101.4489, 48.5549) -> (93.8289, 48.5549) construction
  line L41 (93.8289, 48.5549) -> (93.8289, -2.2451) construction
  line L42 (93.8289, -2.2451) -> (57.5168, -2.2451) construction
  line L43 (57.5168, -2.2451) -> (57.5168, 5.3749) construction
  line L44 (57.5168, 5.3749) -> (34.067, 5.3749) construction
  line L45 (34.067, 5.3749) -> (34.067, -2.2451) construction
  line L46 (34.067, -2.2451) -> (-2.2451, -2.2451) construction
  line L47 (-2.2451, -2.2451) -> (-2.2451, 351.4951) construction
  line L48 (-2.2451, 351.4951) -> (32.1888, 351.4951) construction
  line L49 (32.1888, 351.4951) -> (32.1888, 359.1151) construction
  line L50 (32.1888, 359.1151) -> (62.0789, 359.1151) construction
  line L51 (62.0789, 359.1151) -> (62.0789, 351.4951) construction
  line L52 (31.8219, 0) -> (31.8219, 7.62) projected
  circle A16 centre (34.067, 5.3749) radius 3.175
  line L53 (31.8219, 7.62) -> (59.7619, 7.62) projected
  circle A17 centre (57.5168, 5.3749) radius 3.175
  line L54 (57.5168, 176.3499) -> (34.067, 176.3499) construction
  line L55 (34.067, 176.3499) -> (34.067, 171.9501) construction
  line L56 (34.067, 171.9501) -> (57.5168, 171.9501) construction
  line L57 (57.5168, 171.9501) -> (57.5168, 176.3499) construction
  circle A18 centre (57.5168, 176.3499) radius 3.175
  line L58 (59.7619, 178.595) -> (59.7619, 169.705) projected
  circle A19 centre (57.5168, 171.9501) radius 3.175
  line L59 (31.8219, 169.705) -> (31.8219, 178.595) projected
  circle A20 centre (34.067, 171.9501) radius 3.175
  circle A21 centre (34.067, 176.3499) radius 3.175
  point P0 (-3.6662, 349.25)
  dimension "d79" = 6.35
  dimension "d80" = 6.35
extrude "Extrusion18" cut sketch "Sketch18" against normal through all
equation "\"d1\" = Panel_Thickness"
equation "\"d6\" = Panel_Thickness"
equation "\"d7\" = Panel_Thickness"
equation "\"d13\" = Panel_Thickness"
equation "\"d15\" = Panel_Thickness"
equation "\"d17\" = Panel_Thickness"
equation "\"d24\" = Panel_Thickness"
equation "\"d48\" = Panel_Thickness"
equation "\"d54\" = Panel_Thickness"
equation "\"d63\" = Tool_Dia"
equation "\"d64\" = d63"
equation "\"d65\" = d63"
equation "\"d66\" = d63"
equation "\"d67\" = d63"
equation "\"d68\" = d63"
equation "\"d69\" = d63"
equation "\"d70\" = d63"
equation "\"d60\" = Fit_Tolerance"
equation "\"d61\" = Fit_Tolerance"
equation "\"d62\" = Fit_Tolerance"
equation "\"d73\" = Fit_Tolerance"
equation "\"d74\" = d73"
equation "\"d79\" = Tool_Dia"
equation "\"d80\" = Tool_Dia"
equation "\"Panel_Thickness\" = 6.35"
equation "\"Fit_Tolerance\" = 1.27"
equation "\"Tool_Dia\" = 6.35"
properties part number "BA03" material "Polyethylene, High Density"
